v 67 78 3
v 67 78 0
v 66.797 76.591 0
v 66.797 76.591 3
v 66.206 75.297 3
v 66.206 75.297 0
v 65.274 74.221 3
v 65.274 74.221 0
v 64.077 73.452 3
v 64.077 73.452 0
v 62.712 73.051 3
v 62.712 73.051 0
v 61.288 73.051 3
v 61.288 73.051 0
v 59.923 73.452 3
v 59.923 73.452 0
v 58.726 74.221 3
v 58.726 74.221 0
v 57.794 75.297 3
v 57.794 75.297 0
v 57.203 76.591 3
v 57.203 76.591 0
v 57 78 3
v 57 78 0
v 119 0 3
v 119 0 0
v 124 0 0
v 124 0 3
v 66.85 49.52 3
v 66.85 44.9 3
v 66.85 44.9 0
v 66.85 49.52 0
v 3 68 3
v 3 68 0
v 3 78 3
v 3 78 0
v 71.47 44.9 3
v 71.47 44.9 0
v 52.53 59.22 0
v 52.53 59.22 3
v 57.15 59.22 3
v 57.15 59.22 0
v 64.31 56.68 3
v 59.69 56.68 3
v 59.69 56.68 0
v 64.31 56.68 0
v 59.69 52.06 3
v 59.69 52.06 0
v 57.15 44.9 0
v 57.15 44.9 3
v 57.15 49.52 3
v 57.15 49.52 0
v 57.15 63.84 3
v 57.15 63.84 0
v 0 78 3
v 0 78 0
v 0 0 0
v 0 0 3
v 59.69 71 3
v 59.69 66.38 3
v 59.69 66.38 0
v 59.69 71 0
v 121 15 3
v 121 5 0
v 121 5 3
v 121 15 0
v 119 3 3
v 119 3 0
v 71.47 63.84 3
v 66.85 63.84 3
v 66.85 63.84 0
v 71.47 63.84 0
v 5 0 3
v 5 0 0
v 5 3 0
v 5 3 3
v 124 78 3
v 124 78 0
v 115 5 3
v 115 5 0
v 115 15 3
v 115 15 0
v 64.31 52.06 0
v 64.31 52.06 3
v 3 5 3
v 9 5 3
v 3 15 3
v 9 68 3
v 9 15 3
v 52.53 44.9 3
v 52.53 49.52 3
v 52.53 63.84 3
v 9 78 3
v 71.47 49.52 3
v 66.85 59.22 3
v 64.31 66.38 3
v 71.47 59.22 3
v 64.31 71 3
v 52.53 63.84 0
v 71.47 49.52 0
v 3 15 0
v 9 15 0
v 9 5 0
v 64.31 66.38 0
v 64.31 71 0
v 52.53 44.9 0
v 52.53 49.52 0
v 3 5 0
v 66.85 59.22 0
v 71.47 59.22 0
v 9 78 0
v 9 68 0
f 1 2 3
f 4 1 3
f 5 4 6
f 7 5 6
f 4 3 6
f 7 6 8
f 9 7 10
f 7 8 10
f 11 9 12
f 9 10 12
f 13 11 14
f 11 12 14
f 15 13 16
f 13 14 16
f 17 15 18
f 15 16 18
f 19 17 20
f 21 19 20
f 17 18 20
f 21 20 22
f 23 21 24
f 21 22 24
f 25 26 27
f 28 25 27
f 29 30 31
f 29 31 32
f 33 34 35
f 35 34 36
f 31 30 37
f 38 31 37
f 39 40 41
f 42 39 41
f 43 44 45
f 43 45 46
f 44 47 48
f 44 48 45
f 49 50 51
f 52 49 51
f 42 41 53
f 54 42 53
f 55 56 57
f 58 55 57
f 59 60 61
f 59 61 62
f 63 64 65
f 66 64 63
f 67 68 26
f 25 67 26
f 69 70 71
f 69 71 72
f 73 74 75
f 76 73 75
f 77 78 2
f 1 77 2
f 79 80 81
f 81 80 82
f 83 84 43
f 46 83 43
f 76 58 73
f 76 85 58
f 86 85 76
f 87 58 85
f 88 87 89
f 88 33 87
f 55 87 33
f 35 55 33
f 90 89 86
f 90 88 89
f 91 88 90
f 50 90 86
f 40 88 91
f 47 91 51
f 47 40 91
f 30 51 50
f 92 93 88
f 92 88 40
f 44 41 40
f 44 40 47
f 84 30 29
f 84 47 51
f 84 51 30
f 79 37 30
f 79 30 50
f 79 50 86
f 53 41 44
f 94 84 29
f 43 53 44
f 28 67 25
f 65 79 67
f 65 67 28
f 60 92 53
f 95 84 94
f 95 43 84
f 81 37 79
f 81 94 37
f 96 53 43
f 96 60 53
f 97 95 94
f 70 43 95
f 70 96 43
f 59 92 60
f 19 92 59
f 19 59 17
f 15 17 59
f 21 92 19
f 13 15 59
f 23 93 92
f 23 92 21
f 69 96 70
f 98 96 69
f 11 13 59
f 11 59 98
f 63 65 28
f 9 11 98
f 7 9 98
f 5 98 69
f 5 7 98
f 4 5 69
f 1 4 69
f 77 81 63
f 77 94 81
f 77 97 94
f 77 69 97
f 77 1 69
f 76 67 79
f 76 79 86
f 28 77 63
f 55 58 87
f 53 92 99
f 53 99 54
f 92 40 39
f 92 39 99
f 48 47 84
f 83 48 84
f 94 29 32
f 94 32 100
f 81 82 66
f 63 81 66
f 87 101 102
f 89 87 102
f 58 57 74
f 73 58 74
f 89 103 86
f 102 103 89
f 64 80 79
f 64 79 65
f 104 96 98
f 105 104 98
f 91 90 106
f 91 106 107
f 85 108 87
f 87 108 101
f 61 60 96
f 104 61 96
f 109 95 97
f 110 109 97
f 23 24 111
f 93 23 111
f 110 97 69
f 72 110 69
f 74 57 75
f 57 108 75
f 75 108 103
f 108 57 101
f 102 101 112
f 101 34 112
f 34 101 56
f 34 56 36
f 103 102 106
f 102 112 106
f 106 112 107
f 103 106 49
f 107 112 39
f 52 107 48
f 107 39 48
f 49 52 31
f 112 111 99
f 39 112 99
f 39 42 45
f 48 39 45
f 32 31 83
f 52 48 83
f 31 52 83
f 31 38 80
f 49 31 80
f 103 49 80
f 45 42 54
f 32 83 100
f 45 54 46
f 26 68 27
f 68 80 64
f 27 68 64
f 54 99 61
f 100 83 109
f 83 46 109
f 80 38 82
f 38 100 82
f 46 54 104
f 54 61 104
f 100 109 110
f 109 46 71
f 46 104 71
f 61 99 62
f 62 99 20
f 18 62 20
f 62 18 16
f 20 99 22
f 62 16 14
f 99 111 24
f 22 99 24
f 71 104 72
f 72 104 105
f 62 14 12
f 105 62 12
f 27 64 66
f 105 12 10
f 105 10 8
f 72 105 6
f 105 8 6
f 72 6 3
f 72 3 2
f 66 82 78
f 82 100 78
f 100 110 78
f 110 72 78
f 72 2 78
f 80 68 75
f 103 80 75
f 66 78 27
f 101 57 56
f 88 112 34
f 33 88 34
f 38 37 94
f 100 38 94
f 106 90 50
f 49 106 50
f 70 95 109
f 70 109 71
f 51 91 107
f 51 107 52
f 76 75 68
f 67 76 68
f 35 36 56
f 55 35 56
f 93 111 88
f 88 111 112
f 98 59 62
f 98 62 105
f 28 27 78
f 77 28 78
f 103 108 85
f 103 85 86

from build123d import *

# Parameters (mm, degrees)
SKETCH1_W           = 6
SKETCH1_H           = 10
BOSS_EXTRUDE1_DEPTH = 3
SKETCH2_W           = 4.62
SKETCH2_H           = 4.62
CUT_EXTRUDE1_DEPTH  = 147.523035732


with BuildPart() as part:
    # Sketch1 → Boss-Extrude1 (new body)
    with BuildSketch(Plane.XY):
        with BuildLine():
            Line((0, 0), (5, 0))
            Line((5, 0), (5, 3))
            Line((5, 3), (119, 3))
            Line((119, 3), (119, 0))
            Line((119, 0), (124, 0))
            Line((124, 0), (124, 78))
            Line((124, 78), (67, 78))
            ThreePointArc((67, 78), (62, 73), (57, 78))
            Line((57, 78), (9, 78))
            Line((9, 78), (9, 68))
            Line((9, 68), (3, 68))
            Line((3, 68), (3, 78))
            Line((3, 78), (0, 78))
            Line((0, 78), (0, 0))
        make_face()
        with Locations((6, 10)):
            Rectangle(SKETCH1_W, SKETCH1_H, mode=Mode.SUBTRACT)
        with Locations((118, 10)):
            Rectangle(SKETCH1_W, SKETCH1_H, mode=Mode.SUBTRACT)
    extrude(amount=BOSS_EXTRUDE1_DEPTH)

    # Sketch2 → Cut-Extrude1 (cut, through all)
    with BuildSketch(Plane.XY.offset(3)):
        with Locations((54.84, 61.53)):
            Rectangle(SKETCH2_W, SKETCH2_H)
        with Locations((69.16, 61.53)):
            Rectangle(SKETCH2_W, SKETCH2_H)
        with Locations((54.84, 47.21)):
            Rectangle(SKETCH2_W, SKETCH2_H)
        with Locations((69.16, 47.21)):
            Rectangle(SKETCH2_W, SKETCH2_H)
        with Locations((62, 54.37)):
            Rectangle(SKETCH2_W, SKETCH2_H)
        with Locations((62, 68.69)):
            Rectangle(SKETCH2_W, SKETCH2_H)
    extrude(amount=-CUT_EXTRUDE1_DEPTH, mode=Mode.SUBTRACT)


solid = part.part
